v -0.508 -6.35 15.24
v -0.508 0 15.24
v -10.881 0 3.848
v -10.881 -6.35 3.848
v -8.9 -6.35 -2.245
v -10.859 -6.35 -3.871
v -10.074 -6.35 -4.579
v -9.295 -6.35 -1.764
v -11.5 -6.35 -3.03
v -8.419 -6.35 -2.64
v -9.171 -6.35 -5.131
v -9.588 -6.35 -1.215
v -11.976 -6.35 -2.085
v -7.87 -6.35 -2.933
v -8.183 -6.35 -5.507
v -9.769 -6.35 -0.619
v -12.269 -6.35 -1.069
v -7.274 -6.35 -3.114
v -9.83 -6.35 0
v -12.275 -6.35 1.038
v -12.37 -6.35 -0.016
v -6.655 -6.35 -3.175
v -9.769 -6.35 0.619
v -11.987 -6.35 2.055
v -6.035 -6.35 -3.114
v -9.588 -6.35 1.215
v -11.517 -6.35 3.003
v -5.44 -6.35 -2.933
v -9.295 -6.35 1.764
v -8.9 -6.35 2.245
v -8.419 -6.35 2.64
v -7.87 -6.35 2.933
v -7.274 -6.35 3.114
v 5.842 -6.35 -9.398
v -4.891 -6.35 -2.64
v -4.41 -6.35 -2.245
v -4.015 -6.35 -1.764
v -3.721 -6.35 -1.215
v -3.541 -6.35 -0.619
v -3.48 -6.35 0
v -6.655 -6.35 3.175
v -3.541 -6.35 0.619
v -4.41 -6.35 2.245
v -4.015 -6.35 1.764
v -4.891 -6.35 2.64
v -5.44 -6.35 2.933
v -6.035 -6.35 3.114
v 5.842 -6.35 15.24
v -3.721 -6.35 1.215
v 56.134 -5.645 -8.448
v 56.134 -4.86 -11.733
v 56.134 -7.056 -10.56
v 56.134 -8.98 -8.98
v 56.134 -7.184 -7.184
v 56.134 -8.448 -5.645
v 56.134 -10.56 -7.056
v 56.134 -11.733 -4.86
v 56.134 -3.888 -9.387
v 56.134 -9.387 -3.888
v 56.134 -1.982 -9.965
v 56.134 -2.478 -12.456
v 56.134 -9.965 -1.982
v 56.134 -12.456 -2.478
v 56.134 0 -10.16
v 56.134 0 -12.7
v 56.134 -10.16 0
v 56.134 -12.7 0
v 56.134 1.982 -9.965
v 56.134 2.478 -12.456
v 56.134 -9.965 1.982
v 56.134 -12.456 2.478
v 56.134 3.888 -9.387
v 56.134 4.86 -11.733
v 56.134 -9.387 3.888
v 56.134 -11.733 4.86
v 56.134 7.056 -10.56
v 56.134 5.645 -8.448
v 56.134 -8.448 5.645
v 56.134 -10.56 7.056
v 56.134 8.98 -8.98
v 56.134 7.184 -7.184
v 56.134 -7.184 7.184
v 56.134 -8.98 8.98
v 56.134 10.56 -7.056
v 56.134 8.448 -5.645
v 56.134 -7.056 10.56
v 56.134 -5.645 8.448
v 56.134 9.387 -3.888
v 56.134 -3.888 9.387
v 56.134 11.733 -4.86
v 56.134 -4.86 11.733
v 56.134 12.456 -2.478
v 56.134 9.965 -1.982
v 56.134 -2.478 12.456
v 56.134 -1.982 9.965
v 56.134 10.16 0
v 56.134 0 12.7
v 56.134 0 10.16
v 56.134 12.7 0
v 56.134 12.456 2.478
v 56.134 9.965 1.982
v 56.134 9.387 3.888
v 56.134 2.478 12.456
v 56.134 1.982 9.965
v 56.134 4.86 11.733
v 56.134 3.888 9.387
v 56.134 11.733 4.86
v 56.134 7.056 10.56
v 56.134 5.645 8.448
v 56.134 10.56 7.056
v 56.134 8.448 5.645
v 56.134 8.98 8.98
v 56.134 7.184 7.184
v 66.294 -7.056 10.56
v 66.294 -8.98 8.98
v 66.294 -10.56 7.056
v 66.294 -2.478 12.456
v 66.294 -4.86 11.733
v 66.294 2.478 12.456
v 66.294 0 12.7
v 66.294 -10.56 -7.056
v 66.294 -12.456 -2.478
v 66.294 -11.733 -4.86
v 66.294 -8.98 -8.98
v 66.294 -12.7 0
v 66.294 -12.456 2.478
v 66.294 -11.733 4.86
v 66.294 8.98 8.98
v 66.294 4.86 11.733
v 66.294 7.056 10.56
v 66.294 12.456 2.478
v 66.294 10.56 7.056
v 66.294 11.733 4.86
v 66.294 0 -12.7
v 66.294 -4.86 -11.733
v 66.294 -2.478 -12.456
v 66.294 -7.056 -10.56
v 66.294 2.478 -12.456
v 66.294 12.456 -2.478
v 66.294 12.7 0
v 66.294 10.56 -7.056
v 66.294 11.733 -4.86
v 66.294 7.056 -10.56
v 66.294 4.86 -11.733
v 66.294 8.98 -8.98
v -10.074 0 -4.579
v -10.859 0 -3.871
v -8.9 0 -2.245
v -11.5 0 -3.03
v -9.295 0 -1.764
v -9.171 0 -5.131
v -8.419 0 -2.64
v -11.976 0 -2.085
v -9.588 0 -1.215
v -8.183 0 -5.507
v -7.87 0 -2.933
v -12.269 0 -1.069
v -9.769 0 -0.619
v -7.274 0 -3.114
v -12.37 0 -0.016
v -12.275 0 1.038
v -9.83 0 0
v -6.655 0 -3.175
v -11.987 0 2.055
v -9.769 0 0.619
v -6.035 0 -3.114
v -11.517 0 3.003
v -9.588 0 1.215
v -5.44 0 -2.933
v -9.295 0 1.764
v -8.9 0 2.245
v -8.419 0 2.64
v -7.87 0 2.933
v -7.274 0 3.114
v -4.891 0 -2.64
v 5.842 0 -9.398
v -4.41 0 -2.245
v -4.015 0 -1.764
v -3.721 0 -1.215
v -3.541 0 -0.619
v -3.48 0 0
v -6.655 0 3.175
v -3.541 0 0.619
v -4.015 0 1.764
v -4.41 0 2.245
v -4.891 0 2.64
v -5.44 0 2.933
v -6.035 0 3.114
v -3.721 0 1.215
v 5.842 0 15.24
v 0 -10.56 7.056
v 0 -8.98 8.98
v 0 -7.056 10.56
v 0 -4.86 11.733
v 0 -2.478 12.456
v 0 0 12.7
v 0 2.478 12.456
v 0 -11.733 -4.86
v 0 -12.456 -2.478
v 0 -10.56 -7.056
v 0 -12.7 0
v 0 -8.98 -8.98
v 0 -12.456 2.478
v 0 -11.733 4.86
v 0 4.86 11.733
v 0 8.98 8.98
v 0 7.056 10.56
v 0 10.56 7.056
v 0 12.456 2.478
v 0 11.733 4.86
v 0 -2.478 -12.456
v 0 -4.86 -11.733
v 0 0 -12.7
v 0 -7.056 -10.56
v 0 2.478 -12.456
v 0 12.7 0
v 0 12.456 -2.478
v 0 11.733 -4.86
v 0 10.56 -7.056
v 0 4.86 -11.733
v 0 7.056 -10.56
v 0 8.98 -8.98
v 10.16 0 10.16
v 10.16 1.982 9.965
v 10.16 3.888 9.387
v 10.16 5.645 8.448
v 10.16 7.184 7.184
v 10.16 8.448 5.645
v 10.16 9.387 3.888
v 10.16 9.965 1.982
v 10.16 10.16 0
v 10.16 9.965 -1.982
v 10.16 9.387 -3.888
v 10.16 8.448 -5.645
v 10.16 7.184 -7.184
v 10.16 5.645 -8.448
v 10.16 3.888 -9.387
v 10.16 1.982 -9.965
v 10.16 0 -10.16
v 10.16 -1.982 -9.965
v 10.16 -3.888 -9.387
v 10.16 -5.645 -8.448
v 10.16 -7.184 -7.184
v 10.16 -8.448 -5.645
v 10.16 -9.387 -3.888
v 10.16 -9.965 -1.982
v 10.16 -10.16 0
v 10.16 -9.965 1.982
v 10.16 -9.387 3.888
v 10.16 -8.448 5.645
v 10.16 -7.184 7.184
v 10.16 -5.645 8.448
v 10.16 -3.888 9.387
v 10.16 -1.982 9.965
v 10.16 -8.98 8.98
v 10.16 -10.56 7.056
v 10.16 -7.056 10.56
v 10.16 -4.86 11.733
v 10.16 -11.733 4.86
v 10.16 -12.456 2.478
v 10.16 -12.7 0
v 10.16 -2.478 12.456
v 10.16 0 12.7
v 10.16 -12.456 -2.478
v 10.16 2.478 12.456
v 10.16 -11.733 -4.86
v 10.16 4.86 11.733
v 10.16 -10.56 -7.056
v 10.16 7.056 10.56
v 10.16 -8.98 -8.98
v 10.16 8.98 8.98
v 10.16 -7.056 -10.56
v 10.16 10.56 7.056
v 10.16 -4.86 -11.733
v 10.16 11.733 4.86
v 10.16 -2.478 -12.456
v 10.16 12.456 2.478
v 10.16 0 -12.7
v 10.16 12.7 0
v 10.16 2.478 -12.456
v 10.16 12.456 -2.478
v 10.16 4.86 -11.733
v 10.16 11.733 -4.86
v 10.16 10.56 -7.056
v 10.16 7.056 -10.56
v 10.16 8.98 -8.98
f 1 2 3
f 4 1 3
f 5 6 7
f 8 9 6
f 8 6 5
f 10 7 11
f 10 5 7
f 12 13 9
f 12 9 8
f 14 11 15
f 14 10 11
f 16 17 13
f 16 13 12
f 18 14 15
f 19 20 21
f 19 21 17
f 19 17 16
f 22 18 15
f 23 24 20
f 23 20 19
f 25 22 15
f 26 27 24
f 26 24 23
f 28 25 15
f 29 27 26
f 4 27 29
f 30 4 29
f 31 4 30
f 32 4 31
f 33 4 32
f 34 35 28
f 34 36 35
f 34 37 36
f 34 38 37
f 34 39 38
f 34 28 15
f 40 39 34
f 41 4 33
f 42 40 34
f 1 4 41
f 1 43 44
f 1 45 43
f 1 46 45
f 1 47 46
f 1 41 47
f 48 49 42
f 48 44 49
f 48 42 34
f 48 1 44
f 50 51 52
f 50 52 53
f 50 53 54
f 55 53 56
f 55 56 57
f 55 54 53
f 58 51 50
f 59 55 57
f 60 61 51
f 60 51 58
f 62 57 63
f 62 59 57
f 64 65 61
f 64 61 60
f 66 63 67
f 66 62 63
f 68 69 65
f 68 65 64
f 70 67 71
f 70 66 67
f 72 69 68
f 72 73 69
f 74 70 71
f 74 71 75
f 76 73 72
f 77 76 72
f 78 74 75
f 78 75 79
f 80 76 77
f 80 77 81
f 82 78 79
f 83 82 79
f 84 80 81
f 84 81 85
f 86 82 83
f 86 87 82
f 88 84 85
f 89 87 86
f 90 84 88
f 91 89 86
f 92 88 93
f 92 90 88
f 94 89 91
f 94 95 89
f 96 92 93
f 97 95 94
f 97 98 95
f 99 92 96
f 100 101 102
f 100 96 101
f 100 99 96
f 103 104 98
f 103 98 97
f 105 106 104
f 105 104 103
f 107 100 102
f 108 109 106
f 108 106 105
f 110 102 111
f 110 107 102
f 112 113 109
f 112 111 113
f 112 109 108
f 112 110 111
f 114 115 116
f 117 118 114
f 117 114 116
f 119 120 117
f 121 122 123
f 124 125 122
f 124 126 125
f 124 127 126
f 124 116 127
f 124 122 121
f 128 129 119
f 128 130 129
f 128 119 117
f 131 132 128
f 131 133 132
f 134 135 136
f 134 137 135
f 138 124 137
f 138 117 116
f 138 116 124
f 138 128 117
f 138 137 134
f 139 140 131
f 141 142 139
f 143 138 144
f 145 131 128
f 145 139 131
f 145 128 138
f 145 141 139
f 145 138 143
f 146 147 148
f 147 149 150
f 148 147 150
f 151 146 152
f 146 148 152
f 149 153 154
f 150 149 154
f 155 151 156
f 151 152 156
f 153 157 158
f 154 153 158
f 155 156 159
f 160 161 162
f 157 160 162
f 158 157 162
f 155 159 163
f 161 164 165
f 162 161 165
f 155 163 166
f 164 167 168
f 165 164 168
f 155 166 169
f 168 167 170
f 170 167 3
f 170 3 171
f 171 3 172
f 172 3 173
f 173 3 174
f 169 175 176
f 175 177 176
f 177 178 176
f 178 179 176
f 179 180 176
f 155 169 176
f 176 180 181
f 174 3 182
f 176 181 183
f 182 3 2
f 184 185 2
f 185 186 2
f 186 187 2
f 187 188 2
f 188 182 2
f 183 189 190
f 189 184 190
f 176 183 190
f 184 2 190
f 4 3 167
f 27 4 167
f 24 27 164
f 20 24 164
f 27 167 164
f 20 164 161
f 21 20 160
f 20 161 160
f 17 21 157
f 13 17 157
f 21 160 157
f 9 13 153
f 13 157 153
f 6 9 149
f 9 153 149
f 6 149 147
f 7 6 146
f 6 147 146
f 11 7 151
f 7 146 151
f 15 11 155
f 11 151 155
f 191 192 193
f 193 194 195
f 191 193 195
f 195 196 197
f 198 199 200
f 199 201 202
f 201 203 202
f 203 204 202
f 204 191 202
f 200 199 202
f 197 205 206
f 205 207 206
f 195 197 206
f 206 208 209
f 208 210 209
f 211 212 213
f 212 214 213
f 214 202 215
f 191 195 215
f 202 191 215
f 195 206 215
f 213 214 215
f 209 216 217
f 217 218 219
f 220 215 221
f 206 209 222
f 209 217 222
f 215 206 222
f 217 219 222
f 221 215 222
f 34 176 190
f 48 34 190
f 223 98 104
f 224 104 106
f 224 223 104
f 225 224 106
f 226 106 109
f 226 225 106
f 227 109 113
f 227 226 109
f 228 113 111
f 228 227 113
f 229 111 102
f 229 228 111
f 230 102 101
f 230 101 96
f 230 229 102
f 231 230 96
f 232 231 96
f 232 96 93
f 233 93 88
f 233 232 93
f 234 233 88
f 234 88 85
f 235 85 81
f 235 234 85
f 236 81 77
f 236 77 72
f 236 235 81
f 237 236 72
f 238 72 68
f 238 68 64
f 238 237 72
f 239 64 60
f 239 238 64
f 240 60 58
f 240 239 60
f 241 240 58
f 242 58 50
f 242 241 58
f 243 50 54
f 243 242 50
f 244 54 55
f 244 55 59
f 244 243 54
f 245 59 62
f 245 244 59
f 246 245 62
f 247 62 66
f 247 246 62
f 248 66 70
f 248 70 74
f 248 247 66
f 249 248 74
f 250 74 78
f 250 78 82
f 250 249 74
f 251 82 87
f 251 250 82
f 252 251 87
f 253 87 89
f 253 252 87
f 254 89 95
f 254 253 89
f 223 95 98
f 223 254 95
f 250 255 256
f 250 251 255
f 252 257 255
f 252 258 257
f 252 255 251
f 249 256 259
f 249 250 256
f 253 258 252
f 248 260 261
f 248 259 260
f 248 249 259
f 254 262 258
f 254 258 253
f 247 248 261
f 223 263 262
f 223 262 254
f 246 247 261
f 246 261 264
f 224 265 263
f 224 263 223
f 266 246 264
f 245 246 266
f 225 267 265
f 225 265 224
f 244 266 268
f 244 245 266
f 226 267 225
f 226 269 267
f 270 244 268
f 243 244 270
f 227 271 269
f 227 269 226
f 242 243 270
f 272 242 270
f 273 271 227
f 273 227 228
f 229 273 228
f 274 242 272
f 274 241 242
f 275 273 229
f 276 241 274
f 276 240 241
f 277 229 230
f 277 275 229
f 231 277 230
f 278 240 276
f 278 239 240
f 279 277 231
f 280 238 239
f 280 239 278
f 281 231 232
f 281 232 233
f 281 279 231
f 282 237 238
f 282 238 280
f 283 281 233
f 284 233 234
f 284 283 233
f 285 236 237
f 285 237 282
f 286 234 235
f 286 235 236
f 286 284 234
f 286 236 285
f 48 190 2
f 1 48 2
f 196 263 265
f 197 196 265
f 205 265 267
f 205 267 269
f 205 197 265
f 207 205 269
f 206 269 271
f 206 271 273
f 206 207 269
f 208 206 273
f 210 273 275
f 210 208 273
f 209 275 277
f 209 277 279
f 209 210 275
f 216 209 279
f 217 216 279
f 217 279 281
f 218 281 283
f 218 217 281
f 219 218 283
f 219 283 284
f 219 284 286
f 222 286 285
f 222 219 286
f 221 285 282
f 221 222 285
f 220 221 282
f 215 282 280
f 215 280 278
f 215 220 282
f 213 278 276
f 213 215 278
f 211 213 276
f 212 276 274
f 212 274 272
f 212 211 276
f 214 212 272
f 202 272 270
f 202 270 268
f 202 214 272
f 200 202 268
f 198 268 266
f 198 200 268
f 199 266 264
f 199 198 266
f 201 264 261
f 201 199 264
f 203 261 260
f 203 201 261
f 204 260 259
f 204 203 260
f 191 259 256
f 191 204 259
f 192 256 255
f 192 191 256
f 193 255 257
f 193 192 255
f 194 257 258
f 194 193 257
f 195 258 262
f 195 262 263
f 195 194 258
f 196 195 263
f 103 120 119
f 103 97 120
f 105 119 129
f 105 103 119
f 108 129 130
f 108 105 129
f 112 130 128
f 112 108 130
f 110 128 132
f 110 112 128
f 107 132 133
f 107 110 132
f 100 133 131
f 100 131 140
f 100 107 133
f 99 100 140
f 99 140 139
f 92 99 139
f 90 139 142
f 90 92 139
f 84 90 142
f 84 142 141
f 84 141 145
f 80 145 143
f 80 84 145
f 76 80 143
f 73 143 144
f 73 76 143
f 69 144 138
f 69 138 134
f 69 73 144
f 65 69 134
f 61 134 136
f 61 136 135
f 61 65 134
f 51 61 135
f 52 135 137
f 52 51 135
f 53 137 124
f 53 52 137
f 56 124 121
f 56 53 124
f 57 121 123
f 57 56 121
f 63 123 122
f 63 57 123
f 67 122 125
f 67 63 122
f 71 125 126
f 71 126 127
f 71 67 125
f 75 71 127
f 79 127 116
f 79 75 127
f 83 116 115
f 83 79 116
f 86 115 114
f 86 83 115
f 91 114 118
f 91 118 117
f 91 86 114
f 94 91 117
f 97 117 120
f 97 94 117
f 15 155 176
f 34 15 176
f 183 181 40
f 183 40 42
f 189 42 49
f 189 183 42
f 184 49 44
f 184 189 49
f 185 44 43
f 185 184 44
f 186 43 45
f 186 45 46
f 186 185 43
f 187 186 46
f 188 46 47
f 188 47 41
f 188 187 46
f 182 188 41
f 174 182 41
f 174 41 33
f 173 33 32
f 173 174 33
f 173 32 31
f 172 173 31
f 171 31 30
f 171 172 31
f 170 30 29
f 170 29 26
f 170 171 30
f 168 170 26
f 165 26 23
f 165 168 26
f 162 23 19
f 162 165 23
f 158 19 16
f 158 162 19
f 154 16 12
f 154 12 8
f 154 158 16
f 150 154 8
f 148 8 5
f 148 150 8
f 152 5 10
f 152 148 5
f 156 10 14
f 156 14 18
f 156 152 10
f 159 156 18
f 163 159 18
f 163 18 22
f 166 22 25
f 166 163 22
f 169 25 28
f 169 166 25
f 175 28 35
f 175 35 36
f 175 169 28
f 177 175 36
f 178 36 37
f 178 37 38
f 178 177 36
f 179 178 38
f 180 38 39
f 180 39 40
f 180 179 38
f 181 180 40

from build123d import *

# Parameters (mm, degrees)
F0_W     = 5.842
F0_H     = 12.7
F0_R     = 3.175
F2_DEPTH = 6.35


with BuildPart() as f1:
    # F0 (on Front) → F1 (revolve)
    with BuildSketch(Plane.XZ):
        Polygon((5.842, 12.7), (5.842, 0), (66.294, 0), (66.294, 12.7), (56.134, 12.7), (56.134, 10.16), (10.16, 10.16), (10.16, 12.7), align=None)
        with Locations((2.921, 6.35)):
            Rectangle(F0_W, F0_H)
    revolve(axis=Axis((33.147, 0, 0), (-1, 0, 0)))


with BuildPart() as f2:
    # F0 (on Front) → F2 (new body)
    with BuildSketch(Plane.XZ):
        with BuildLine():
            Line((-0.9398, 0), (0, 0))
            Line((0, 0), (0, 12.7))
            Line((0, 12.7), (5.842, 12.7))
            Line((5.842, 12.7), (5.842, 15.24))
            Line((5.842, 15.24), (-0.508, 15.24))
            Line((-0.508, 15.24), (-10.88063, 3.847543))
            ThreePointArc((-10.88063, 3.847543), (-4.591961, 5.329721), (-0.9398, 0))
        make_face()
        with Locations((2.921, 6.35)):
            Rectangle(F0_W, F0_H)
        with BuildLine():
            Line((5.842, 0), (0, 0))
            Line((0, 0), (-0.9398, 0))
            ThreePointArc((-0.9398, 0), (-3.195791, -4.549339), (-8.182663, -5.506983))
            Line((-8.182663, -5.506983), (5.842, -9.398))
            Line((5.842, -9.398), (5.842, 0))
        make_face()
        with BuildLine():
            ThreePointArc((-8.182663, -5.506983), (-3.195791, -4.549339), (-0.9398, 0))
            ThreePointArc((-0.9398, 0), (-4.591961, 5.329721), (-10.88063, 3.847543))
            ThreePointArc((-10.88063, 3.847543), (-12.145978, -1.583727), (-8.182663, -5.506983))
        make_face()
        with Locations((-6.6548, 0)):
            Circle(F0_R, mode=Mode.SUBTRACT)
    extrude(amount=F2_DEPTH)


solid = Compound([f1.part, f2.part])
